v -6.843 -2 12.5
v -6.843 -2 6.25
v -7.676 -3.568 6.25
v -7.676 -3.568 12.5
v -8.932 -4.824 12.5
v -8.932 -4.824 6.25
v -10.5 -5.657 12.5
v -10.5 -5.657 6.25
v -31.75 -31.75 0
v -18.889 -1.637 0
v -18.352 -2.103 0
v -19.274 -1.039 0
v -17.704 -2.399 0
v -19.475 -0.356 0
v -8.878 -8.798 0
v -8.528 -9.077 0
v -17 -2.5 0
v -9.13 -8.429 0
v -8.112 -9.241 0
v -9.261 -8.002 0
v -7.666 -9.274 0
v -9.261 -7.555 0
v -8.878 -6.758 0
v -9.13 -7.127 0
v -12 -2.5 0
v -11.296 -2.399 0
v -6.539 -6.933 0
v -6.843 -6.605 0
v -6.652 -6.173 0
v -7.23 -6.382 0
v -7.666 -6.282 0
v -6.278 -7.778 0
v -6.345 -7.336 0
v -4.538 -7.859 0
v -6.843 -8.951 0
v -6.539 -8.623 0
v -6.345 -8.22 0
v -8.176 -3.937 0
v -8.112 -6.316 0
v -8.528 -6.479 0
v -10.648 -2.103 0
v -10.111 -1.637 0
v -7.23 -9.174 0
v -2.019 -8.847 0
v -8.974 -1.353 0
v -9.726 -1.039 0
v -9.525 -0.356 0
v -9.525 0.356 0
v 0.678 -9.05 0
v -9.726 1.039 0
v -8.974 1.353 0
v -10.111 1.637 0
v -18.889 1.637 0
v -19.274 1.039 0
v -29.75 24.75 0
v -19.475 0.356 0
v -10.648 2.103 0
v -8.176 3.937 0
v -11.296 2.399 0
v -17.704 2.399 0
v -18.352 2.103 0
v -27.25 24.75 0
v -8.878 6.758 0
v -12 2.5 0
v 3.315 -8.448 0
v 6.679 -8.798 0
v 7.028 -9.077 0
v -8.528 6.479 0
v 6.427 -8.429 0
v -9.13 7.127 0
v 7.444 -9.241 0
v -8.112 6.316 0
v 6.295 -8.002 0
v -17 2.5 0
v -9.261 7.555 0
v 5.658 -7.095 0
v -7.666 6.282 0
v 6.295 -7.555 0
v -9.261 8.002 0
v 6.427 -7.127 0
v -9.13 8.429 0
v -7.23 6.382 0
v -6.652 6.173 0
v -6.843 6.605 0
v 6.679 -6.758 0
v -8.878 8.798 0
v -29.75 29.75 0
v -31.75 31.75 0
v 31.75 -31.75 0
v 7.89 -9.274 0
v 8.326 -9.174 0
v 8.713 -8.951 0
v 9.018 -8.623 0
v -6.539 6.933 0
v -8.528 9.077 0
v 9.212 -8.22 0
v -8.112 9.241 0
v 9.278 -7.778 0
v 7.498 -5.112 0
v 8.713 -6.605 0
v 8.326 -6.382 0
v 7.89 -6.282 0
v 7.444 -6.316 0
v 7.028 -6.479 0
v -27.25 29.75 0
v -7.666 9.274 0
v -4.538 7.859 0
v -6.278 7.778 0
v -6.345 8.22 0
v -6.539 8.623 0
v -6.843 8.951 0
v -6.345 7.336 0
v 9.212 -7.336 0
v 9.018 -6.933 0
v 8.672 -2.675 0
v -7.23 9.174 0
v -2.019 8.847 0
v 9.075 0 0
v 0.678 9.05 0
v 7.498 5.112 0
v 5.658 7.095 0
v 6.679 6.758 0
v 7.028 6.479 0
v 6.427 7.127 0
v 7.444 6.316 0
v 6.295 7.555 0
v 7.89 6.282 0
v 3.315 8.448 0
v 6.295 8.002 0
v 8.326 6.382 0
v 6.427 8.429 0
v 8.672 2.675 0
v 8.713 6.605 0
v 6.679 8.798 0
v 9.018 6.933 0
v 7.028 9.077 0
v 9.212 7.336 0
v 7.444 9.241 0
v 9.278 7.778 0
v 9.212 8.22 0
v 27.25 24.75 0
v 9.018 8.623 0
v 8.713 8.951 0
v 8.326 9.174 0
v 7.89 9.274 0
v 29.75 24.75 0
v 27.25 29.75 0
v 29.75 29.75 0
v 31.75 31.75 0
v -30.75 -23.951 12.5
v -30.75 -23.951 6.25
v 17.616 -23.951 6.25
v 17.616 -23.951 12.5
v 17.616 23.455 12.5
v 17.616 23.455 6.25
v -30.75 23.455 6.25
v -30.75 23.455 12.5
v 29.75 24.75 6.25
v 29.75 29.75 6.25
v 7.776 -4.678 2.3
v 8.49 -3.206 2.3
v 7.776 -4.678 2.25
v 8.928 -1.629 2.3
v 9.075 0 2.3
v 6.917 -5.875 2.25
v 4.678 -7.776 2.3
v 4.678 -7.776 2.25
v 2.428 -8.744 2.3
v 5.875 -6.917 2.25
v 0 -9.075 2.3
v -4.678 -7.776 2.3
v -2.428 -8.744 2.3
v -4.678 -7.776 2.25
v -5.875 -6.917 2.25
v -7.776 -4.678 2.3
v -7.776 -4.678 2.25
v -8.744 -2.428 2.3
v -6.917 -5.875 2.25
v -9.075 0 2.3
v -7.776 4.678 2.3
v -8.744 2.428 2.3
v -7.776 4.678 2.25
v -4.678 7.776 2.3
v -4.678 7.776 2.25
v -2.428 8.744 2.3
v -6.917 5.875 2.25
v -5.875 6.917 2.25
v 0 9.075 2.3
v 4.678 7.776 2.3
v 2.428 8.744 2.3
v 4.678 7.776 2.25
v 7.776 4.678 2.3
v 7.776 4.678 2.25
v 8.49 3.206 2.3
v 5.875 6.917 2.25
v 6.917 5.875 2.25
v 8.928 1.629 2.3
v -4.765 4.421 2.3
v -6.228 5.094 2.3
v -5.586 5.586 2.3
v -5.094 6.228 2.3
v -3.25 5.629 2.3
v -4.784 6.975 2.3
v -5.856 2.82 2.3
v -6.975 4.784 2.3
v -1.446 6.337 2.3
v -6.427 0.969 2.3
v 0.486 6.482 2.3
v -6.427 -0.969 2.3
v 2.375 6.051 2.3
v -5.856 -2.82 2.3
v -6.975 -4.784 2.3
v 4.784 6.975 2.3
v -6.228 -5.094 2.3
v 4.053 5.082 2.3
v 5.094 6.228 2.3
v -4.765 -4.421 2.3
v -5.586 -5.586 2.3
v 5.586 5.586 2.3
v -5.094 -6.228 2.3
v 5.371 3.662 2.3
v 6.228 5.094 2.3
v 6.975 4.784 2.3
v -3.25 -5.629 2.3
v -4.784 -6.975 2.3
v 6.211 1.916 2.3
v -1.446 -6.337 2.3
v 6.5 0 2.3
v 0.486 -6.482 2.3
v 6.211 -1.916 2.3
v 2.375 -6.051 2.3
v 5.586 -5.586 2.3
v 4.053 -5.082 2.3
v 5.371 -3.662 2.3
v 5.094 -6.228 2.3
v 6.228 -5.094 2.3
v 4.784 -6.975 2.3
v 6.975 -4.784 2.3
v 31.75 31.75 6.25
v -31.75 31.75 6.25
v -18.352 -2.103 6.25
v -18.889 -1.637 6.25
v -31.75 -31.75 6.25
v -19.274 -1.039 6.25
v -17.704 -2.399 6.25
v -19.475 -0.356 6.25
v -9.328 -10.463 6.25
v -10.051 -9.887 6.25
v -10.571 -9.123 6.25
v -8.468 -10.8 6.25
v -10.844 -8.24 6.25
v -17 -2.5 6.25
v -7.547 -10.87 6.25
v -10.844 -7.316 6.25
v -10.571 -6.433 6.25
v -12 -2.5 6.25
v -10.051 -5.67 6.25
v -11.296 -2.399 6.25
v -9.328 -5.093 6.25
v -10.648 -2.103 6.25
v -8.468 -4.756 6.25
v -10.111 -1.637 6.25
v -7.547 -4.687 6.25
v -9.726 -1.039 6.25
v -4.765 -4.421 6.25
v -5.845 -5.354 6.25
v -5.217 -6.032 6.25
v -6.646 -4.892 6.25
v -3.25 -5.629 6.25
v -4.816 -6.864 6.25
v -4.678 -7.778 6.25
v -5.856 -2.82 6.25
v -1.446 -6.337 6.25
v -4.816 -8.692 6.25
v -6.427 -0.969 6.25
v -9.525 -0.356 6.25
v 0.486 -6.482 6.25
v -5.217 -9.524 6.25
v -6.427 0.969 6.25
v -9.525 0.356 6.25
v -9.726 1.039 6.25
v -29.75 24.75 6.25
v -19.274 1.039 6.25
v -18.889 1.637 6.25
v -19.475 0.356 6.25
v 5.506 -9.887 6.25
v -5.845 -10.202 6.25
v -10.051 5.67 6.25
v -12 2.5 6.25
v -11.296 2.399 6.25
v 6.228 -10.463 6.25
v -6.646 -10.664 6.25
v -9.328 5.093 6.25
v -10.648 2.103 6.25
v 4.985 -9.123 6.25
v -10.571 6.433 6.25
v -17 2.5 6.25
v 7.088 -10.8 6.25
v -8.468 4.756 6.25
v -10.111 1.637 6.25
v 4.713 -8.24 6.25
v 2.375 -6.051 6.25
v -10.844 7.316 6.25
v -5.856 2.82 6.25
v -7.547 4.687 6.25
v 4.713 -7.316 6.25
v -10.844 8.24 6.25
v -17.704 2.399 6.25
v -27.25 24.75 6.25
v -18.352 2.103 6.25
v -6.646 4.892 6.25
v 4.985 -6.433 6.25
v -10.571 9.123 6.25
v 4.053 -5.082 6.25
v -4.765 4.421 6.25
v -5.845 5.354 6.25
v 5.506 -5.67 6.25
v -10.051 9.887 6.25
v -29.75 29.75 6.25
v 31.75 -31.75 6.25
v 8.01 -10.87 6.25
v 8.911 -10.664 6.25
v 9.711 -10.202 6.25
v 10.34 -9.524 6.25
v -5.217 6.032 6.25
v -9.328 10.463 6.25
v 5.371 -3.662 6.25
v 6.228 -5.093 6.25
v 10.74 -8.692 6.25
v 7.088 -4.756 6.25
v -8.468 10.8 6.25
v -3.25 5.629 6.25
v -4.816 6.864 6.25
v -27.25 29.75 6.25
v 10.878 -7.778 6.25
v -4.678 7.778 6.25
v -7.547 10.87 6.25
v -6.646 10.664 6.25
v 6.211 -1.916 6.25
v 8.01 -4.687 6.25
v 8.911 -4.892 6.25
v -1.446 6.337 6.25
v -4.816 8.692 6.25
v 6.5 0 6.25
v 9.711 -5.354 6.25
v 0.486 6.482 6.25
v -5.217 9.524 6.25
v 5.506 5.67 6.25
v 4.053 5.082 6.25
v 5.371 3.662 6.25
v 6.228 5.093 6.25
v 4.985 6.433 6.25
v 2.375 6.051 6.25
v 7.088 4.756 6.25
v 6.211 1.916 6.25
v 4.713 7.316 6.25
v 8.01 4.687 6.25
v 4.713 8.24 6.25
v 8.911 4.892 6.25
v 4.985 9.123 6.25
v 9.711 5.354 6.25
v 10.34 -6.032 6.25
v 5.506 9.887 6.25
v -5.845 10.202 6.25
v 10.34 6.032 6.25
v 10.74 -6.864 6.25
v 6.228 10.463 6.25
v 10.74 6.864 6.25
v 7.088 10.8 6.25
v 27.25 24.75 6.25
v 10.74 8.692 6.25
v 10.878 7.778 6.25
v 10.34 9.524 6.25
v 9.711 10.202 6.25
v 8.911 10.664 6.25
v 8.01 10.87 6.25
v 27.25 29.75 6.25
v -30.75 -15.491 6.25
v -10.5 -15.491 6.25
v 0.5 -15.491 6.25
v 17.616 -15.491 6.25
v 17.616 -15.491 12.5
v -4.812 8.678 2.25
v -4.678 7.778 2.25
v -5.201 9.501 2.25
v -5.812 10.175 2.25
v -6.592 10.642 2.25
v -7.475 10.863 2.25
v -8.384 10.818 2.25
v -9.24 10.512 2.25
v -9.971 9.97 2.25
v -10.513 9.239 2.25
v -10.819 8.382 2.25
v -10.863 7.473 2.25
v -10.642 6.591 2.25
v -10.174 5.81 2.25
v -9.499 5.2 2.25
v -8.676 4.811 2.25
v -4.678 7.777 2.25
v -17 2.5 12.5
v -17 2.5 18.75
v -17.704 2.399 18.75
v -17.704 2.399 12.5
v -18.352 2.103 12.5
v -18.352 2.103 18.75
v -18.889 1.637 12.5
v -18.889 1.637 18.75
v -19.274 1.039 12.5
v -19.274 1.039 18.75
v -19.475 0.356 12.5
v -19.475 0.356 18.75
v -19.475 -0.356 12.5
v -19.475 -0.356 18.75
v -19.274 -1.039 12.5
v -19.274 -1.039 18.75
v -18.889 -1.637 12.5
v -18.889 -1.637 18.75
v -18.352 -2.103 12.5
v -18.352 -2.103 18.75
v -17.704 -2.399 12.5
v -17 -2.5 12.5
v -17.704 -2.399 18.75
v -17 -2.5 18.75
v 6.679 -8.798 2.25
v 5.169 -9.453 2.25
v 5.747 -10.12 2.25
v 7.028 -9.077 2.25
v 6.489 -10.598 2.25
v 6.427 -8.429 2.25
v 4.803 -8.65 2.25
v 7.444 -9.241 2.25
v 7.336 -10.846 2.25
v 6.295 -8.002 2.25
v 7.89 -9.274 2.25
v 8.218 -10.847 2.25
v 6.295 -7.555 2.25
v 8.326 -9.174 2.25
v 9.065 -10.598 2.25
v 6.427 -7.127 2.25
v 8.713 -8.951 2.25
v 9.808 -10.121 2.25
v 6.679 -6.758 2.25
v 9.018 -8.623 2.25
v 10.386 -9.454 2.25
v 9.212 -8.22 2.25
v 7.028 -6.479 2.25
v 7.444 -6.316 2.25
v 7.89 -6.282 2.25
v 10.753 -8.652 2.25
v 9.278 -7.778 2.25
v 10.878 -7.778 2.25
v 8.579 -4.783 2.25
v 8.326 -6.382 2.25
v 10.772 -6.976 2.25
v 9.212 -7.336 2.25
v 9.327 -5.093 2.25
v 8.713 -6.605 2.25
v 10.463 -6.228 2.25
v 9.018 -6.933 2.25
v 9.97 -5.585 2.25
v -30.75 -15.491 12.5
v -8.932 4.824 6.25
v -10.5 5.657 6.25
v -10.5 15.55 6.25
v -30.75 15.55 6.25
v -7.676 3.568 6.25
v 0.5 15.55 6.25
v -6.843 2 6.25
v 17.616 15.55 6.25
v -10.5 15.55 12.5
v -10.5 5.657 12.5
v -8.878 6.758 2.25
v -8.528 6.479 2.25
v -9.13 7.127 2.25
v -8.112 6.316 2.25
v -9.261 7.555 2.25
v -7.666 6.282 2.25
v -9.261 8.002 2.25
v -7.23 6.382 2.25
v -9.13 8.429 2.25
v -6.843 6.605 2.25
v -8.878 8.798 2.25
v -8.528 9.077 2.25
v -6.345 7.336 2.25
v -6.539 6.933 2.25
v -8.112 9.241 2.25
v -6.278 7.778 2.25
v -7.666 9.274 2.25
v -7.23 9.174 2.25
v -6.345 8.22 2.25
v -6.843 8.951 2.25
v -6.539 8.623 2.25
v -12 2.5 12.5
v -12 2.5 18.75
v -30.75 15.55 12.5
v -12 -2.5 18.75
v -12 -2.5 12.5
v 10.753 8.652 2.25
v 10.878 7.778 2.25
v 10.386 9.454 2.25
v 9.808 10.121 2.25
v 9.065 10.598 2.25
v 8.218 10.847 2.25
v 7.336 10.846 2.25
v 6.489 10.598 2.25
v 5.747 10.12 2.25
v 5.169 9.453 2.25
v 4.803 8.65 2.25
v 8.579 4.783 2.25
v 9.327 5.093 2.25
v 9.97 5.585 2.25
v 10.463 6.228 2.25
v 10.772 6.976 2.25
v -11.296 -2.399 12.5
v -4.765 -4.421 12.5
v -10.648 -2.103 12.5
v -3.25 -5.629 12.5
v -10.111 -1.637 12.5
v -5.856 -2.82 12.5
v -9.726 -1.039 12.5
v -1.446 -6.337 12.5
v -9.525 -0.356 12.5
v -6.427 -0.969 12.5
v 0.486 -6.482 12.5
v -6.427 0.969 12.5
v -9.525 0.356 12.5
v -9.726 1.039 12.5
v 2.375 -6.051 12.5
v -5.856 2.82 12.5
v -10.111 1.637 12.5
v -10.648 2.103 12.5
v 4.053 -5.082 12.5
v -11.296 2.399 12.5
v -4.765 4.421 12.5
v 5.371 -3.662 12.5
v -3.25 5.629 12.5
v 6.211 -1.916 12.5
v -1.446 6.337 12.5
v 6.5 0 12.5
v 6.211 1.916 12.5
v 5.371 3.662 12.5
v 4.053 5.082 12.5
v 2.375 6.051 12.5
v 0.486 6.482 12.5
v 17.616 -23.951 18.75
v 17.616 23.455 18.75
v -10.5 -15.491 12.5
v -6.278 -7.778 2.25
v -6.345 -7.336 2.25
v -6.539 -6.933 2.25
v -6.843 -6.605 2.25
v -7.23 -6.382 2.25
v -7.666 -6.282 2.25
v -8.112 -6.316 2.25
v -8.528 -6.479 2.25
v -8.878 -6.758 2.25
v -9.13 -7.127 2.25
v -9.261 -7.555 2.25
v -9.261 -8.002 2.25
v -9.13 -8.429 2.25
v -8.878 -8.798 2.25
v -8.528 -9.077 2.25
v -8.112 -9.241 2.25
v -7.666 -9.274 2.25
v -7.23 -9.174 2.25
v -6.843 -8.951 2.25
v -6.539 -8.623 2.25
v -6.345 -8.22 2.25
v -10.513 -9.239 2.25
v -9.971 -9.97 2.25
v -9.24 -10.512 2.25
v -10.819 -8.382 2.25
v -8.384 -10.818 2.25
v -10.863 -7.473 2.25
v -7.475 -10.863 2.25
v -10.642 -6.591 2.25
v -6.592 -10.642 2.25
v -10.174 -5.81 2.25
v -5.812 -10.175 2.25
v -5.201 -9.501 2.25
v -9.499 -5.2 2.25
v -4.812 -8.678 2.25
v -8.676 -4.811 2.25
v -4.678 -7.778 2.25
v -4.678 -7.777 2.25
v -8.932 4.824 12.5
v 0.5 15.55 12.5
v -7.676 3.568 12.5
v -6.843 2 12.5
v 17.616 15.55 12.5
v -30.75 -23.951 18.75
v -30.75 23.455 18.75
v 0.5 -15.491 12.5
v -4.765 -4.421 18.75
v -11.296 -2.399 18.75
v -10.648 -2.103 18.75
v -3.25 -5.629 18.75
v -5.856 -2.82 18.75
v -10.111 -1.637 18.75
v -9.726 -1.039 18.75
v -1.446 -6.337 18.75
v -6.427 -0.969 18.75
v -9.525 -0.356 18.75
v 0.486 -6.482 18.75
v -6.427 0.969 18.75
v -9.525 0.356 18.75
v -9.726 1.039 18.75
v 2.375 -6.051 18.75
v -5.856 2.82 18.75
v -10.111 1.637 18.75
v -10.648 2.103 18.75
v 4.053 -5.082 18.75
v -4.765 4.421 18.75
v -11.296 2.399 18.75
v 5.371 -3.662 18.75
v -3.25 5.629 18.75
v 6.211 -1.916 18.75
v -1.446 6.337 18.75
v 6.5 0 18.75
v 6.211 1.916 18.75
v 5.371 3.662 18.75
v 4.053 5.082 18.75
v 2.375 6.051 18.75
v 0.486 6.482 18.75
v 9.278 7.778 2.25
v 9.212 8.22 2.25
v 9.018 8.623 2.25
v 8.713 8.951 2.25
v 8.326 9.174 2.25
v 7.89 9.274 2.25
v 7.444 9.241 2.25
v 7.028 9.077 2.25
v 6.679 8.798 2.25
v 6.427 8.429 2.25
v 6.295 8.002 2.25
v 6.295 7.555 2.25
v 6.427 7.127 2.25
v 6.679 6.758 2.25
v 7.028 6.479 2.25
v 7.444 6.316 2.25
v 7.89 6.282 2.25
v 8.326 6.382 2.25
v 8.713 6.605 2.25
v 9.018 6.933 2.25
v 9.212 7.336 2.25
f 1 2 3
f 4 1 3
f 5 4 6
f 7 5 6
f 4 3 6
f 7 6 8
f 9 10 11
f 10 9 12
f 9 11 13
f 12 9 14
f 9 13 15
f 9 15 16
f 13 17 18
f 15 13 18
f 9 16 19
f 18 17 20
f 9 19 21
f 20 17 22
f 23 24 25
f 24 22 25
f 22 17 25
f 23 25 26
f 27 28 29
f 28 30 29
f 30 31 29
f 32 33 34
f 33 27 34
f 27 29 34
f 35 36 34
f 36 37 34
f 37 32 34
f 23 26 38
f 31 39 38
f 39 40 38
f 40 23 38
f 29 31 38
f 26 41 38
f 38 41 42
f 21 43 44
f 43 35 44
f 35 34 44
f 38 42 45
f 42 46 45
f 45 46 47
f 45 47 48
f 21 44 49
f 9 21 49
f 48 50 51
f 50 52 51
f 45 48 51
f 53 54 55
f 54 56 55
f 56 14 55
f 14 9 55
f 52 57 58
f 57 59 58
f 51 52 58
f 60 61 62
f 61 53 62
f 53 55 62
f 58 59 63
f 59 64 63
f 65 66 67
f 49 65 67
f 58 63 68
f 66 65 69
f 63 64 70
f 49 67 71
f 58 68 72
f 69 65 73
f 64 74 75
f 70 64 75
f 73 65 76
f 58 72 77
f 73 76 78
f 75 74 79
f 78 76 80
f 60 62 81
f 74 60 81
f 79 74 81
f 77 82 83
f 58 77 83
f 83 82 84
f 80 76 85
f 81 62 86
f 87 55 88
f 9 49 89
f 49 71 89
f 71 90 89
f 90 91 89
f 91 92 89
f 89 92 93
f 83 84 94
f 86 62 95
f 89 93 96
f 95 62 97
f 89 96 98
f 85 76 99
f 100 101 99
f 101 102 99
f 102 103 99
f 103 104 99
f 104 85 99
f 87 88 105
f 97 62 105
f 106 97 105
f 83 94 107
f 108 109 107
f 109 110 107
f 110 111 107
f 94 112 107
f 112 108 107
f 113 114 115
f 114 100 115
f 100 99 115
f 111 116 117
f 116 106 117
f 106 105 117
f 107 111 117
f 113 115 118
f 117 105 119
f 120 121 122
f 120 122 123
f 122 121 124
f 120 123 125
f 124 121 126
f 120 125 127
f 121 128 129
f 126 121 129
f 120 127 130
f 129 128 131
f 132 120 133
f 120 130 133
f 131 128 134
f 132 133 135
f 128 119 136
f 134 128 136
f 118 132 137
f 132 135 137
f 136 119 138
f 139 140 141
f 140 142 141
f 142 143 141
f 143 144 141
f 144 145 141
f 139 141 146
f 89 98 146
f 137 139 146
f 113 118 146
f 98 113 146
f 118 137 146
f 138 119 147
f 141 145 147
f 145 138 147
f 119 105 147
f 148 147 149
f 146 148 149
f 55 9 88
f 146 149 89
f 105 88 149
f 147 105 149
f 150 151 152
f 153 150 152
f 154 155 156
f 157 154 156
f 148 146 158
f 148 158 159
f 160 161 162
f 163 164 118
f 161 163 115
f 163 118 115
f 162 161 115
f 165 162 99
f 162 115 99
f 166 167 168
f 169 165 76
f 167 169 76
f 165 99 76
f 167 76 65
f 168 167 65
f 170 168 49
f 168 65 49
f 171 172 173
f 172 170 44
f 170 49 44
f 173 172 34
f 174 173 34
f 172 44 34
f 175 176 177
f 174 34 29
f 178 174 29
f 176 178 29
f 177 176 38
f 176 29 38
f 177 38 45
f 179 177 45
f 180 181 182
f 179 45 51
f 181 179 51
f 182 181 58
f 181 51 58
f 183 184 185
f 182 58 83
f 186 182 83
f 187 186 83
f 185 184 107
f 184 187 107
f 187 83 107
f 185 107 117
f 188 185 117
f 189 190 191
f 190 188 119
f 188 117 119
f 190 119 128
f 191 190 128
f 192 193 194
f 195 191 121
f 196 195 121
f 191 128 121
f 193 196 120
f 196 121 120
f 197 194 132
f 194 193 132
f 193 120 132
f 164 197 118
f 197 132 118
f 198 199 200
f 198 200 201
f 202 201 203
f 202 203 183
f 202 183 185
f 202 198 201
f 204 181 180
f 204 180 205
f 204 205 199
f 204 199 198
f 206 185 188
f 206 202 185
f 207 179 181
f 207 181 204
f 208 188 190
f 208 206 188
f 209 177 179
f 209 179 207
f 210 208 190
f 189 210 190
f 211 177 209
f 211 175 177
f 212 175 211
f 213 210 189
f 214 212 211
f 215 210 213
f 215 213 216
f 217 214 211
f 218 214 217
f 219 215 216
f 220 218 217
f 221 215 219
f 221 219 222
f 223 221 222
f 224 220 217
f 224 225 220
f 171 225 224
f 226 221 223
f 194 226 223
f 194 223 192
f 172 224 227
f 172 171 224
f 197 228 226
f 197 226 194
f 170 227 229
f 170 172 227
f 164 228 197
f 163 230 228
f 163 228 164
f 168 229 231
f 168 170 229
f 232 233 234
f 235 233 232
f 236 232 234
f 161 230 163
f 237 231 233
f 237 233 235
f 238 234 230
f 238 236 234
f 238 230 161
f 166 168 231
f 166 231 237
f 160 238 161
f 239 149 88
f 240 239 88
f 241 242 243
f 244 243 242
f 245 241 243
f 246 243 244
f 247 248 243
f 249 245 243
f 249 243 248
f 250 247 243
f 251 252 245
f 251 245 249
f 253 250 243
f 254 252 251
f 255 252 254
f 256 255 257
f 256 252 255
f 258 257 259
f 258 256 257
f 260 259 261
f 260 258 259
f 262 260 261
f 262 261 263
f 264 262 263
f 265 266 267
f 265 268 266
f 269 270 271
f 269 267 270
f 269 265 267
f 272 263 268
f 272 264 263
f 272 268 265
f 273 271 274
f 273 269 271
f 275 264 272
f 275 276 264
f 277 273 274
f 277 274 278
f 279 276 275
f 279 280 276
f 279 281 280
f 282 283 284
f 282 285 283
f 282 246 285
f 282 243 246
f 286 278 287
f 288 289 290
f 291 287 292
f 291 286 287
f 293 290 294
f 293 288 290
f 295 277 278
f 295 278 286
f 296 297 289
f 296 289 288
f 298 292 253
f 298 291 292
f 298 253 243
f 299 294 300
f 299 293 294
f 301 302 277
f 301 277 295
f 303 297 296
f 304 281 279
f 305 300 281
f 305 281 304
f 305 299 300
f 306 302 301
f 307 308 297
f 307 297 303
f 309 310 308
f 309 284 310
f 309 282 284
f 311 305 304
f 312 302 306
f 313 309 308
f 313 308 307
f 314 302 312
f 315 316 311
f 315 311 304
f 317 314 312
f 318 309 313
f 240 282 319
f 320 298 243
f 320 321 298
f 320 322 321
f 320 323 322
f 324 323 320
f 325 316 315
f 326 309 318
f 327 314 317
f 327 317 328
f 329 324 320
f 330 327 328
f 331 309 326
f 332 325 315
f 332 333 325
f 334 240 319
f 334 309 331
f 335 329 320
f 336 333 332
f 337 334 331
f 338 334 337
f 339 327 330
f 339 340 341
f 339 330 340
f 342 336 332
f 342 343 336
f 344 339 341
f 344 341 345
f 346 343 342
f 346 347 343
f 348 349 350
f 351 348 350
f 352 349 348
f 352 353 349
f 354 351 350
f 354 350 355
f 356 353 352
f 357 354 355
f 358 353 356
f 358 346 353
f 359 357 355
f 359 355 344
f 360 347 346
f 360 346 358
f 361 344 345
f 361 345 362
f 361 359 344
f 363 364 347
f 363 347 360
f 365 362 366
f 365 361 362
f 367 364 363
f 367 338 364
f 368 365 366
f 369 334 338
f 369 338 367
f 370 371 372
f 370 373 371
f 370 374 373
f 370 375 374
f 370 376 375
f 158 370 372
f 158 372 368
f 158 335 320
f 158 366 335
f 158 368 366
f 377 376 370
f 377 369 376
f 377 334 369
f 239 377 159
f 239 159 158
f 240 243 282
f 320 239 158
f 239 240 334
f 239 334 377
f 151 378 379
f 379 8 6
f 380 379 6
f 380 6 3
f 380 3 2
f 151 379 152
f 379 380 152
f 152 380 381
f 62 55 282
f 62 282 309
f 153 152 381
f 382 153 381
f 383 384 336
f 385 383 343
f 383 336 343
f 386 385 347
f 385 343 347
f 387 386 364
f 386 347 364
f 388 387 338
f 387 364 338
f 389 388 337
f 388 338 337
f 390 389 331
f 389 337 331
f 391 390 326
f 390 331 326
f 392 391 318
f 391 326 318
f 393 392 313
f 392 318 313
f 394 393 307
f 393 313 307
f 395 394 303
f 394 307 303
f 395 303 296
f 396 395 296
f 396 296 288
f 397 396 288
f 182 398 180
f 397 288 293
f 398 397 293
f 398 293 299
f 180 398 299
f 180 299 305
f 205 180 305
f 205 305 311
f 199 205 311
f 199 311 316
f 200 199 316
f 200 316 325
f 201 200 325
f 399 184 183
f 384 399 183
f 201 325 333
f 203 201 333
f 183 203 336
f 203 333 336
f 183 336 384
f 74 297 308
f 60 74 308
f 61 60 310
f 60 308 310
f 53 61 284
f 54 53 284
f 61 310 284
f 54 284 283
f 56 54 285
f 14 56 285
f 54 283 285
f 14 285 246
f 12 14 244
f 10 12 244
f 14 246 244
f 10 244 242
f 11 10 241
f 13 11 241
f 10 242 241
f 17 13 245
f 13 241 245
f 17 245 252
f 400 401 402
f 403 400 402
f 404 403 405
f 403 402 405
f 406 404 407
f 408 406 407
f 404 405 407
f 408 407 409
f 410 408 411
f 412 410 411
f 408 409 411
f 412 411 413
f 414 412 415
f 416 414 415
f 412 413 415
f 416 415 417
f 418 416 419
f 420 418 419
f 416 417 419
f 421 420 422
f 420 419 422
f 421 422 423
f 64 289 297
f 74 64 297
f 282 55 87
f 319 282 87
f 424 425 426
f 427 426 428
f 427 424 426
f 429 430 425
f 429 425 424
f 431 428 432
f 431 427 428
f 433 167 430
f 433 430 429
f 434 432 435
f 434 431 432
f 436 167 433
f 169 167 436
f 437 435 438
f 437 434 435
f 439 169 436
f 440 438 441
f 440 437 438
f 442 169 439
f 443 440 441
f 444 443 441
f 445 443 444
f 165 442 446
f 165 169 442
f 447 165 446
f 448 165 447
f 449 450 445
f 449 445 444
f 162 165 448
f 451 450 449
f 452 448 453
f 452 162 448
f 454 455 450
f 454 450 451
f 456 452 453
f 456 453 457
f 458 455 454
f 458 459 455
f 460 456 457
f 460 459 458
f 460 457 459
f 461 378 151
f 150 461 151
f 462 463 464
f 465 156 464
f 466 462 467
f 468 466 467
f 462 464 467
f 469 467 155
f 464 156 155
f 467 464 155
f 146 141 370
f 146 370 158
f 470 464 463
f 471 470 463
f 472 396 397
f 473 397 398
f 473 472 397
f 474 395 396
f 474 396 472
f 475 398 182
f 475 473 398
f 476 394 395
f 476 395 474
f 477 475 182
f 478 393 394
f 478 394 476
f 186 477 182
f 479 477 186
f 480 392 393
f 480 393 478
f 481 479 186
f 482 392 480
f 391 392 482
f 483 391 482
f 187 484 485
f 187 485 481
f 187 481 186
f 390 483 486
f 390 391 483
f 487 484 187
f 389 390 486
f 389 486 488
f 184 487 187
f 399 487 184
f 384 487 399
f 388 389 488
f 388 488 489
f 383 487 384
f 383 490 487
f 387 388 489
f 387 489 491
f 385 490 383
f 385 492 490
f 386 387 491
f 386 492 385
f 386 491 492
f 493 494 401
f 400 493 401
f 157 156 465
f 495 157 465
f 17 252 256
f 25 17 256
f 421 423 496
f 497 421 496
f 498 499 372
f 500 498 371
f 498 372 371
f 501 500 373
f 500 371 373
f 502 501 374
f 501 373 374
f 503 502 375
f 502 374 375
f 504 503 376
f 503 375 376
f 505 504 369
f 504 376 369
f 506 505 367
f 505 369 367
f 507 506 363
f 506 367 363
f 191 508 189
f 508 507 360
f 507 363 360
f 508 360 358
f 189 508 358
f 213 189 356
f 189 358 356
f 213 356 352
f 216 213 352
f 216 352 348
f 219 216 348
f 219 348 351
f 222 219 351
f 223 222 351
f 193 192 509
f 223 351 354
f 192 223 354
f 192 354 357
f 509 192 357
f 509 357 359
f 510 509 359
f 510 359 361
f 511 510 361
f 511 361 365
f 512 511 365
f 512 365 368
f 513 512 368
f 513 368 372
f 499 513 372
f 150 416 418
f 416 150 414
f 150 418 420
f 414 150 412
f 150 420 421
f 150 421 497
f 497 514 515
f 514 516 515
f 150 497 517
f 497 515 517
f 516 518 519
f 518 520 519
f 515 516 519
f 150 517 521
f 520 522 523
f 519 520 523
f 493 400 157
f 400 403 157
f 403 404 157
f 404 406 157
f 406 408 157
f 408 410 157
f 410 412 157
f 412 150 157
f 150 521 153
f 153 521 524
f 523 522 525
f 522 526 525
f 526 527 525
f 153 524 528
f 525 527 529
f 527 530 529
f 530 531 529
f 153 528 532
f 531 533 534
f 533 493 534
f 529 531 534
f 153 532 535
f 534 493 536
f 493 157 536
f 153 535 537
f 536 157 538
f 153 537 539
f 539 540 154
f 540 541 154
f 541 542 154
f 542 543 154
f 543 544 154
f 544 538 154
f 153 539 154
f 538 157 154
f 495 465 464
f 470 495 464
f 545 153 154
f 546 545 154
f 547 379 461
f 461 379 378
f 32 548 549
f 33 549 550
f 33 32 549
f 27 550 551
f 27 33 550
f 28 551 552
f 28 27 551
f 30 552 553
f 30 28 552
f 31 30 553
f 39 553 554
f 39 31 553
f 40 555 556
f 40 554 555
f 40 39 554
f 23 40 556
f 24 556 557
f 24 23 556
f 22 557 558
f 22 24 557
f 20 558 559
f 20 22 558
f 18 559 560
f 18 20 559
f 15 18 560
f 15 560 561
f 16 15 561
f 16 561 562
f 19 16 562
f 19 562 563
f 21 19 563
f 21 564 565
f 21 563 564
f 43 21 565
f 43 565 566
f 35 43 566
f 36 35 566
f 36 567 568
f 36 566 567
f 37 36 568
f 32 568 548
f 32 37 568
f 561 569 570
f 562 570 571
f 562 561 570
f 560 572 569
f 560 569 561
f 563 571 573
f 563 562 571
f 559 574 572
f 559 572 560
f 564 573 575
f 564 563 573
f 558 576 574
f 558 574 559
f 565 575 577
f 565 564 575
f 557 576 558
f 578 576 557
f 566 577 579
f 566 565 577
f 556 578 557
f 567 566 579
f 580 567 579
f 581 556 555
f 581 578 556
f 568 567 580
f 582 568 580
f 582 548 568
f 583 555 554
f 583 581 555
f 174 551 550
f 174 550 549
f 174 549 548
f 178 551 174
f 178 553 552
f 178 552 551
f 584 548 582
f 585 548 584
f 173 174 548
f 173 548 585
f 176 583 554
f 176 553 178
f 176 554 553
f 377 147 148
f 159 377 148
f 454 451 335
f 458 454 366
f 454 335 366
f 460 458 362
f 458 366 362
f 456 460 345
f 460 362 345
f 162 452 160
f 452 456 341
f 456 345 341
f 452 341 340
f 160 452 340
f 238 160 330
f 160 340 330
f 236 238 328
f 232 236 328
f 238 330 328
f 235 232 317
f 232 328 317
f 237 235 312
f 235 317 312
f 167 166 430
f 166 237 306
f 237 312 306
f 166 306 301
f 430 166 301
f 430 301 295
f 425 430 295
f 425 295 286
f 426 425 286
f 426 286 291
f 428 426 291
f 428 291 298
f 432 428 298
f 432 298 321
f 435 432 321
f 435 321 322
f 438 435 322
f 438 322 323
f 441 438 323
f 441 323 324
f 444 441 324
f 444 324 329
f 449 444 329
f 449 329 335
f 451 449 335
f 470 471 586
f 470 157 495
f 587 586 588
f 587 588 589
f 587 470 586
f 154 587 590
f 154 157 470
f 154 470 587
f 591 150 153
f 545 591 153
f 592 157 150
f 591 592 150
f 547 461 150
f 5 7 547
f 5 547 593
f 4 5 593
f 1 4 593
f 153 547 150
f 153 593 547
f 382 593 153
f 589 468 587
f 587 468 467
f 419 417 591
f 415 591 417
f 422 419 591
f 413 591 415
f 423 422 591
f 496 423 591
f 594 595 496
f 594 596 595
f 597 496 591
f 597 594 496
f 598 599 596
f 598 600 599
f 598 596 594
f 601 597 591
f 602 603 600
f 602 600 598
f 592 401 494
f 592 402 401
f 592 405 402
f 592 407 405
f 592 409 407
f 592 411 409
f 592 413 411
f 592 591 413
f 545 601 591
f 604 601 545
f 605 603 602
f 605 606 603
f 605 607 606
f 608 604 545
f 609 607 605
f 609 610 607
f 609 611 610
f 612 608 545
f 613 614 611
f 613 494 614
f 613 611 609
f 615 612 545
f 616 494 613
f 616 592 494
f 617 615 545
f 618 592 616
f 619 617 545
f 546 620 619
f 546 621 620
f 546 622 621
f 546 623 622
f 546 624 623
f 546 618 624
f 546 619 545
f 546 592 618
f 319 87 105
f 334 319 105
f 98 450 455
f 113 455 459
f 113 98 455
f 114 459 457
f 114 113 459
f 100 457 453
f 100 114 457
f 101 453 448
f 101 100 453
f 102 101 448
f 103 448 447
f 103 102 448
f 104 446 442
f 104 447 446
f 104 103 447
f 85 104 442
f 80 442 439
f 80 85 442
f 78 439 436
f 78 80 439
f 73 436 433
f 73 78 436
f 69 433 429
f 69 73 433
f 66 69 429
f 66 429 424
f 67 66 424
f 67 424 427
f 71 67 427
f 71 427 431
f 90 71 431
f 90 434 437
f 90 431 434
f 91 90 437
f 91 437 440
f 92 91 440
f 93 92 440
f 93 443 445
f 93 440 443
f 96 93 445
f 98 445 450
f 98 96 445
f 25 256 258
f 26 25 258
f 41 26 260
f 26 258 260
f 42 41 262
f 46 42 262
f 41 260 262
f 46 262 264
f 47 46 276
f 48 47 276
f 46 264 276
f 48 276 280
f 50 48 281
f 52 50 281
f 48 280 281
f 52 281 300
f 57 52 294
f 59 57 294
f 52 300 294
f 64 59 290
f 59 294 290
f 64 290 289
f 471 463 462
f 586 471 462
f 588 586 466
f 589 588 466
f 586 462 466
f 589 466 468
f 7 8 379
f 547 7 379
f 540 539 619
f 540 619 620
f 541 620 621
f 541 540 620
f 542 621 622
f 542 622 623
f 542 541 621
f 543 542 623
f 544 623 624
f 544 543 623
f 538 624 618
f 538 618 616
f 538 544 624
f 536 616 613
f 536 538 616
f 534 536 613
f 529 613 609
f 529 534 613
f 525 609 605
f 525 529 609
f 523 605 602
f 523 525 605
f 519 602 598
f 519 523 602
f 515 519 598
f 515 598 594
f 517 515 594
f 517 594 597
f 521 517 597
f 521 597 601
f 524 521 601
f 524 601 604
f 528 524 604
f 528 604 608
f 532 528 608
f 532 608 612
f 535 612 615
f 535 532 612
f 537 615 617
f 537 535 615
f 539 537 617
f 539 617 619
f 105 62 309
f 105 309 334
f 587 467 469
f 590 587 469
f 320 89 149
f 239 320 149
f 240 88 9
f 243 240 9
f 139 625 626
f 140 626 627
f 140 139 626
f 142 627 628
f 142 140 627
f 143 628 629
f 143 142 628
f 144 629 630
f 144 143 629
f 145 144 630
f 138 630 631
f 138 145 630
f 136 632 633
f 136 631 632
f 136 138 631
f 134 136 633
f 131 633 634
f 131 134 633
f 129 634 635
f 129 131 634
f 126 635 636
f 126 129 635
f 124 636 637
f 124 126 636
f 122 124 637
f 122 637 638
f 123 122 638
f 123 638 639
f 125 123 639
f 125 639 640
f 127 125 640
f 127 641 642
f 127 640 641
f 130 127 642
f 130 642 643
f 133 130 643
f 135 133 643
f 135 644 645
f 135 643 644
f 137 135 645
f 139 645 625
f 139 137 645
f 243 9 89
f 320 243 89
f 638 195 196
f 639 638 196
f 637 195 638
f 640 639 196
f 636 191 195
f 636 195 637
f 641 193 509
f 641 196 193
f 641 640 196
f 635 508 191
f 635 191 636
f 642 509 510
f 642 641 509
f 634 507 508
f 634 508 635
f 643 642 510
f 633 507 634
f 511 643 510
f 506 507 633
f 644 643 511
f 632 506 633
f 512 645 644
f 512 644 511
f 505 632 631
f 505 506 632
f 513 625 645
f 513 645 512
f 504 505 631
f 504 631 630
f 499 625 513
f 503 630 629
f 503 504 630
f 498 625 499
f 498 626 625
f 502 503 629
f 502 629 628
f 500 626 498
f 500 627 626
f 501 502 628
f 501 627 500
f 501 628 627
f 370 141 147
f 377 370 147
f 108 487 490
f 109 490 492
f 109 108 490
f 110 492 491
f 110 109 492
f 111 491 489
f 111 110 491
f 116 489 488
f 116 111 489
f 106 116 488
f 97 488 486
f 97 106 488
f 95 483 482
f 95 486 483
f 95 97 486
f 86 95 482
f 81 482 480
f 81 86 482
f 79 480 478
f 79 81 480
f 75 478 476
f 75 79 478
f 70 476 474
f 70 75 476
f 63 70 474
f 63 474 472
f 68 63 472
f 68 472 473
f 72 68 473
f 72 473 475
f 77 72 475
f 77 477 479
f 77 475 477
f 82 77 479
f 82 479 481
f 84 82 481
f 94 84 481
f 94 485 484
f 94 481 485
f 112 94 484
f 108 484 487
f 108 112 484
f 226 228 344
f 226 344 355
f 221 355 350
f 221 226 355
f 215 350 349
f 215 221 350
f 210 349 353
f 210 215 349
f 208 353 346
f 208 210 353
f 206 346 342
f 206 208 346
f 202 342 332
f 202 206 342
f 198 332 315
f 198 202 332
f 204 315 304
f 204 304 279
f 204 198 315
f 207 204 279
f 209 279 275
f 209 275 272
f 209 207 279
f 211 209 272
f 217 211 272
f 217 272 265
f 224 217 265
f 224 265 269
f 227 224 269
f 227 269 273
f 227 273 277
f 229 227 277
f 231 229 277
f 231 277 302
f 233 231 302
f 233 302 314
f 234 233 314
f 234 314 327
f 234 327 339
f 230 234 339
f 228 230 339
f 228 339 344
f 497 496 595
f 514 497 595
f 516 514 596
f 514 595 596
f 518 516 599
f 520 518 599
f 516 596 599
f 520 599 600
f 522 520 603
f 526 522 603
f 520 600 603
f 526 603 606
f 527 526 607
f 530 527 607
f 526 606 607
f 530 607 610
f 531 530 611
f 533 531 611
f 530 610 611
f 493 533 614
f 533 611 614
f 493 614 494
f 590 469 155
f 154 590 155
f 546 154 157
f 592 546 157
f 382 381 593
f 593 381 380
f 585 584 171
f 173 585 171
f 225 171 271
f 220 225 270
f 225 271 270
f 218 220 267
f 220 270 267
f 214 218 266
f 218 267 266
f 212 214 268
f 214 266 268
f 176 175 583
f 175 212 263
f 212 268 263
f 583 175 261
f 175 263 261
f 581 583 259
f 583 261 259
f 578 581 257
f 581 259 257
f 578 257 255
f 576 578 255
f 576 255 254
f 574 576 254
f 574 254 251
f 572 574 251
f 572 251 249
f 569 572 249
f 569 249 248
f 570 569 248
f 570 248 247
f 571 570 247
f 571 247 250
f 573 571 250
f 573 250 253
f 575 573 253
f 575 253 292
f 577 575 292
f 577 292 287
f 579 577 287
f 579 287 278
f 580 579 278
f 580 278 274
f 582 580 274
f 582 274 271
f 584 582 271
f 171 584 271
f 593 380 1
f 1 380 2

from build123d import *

# Parameters (mm, degrees)
F3_R      = 1.5
F3_W      = 2.5
F3_H      = 5
F3_R_2    = 6.5
F4_DEPTH  = 6.25
F5_R      = 3.1
F6_DEPTH  = 4
F7_R      = 9.075
F7_R_2    = 6.5
F8_DEPTH  = 2.3
F10_DEPTH = 6.25
F11_R     = 6.5
F12_DEPTH = 6.25
F14_DEPTH = 25


with BuildPart() as f4:
    # F3 (on Top) → F4 (new body)
    with BuildSketch(Plane.XY):
        Polygon((-27.25, 31.75), (-31.75, 31.75), (-31.75, -31.75), (31.75, -31.75), (31.75, 31.75), (27.25, 31.75), align=None)
        with Locations((-7.778175, -7.7781741861)):
            Circle(F3_R, mode=Mode.SUBTRACT)
        with Locations((7.7781741861, -7.778175)):
            Circle(F3_R, mode=Mode.SUBTRACT)
        with Locations((-7.7781741861, 7.778175)):
            Circle(F3_R, mode=Mode.SUBTRACT)
        with Locations((-28.5, 27.25)):
            Rectangle(F3_W, F3_H, mode=Mode.SUBTRACT)
        Circle(F3_R_2, mode=Mode.SUBTRACT)
        with Locations((7.778175, 7.7781741861)):
            Circle(F3_R, mode=Mode.SUBTRACT)
        with Locations((28.5, 27.25)):
            Rectangle(F3_W, F3_H, mode=Mode.SUBTRACT)
    extrude(amount=F4_DEPTH)

    # F5 (on face) → F6 (cut)
    with BuildSketch(Plane.XY.offset(6.25)):
        with Locations((-7.7781741861, 7.778175)):
            Circle(F5_R)
        with Locations((-7.778175, -7.7781741861)):
            Circle(F5_R)
        with Locations((7.7781741861, -7.778175)):
            Circle(F5_R)
        with Locations((7.778175, 7.7781741861)):
            Circle(F5_R)
    extrude(amount=-F6_DEPTH, mode=Mode.SUBTRACT)

    # F7 (on face) → F8 (cut)
    with BuildSketch(Plane(origin=(0, 0, 0), x_dir=(1, 0, 0), z_dir=(0, 0, -1))):
        Circle(F7_R)
        Circle(F7_R_2, mode=Mode.SUBTRACT)
    extrude(amount=-F8_DEPTH, mode=Mode.SUBTRACT)


with BuildPart() as f10:
    # F9 (on face) → F10 (new body)
    with BuildSketch(Plane.XY.offset(6.25)):
        with BuildLine():
            ThreePointArc((-10.5, 5.6568542495), (-8.2573593129, 4.2426406871), (-6.8431457505, 2))
            Line((-6.8431457505, 2), (0.5, 15.5502033014))
            Line((0.5, 15.5502033014), (-10.5, 15.5502033014))
            Line((-10.5, 15.5502033014), (-10.5, 5.6568542495))
        make_face()
        Polygon((-10.5, 15.5502033014), (0.5, 15.5502033014), (17.6161517501, 15.5502033014), (17.6161517501, 23.4547978675), (-30.75, 23.4547978675), (-30.75, 15.5502033014), align=None)
    extrude(amount=F10_DEPTH)


with BuildPart() as f10b:
    # F9 (on face) → F10, piece 2 (new body)
    with BuildSketch(Plane.XY.offset(6.25)):
        Polygon((-10.5, -15.4907594841), (-30.75, -15.4907594841), (-30.75, -23.9506369049), (17.6161517501, -23.9506369049), (17.6161517501, -15.4907594841), (0.5, -15.4907594841), align=None)
        with BuildLine():
            Line((-10.5, -5.6568542495), (-10.5, -15.4907594841))
            Line((-10.5, -15.4907594841), (0.5, -15.4907594841))
            Line((0.5, -15.4907594841), (-6.8431457505, -2))
            ThreePointArc((-6.8431457505, -2), (-8.2573593129, -4.2426406871), (-10.5, -5.6568542495))
        make_face()
    extrude(amount=F10_DEPTH)


with BuildPart() as f12:
    # F11 (on face) → F12 (new body)
    with BuildSketch(Plane.XY.offset(12.5)):
        with BuildLine():
            Line((17.6161517501, 23.4547978675), (-30.75, 23.4547978675))
            Line((-30.75, 23.4547978675), (-30.75, 15.5502033014))
            Line((-30.75, 15.5502033014), (-10.5, 15.5502033014))
            Line((-10.5, 15.5502033014), (-10.5, 5.6568542495))
            ThreePointArc((-10.5, 5.6568542495), (-8.2573593129, 4.2426406871), (-6.8431457505, 2))
            Line((-6.8431457505, 2), (0.5, 15.5502033014))
            Line((0.5, 15.5502033014), (17.6161517501, 15.5502033014))
            Line((17.6161517501, 15.5502033014), (17.6161517501, 23.4547978675))
        make_face()
        with BuildLine():
            Line((-10.5, 15.5502033014), (-30.75, 15.5502033014))
            Line((-30.75, 15.5502033014), (-30.75, -23.9506369049))
            Line((-30.75, -23.9506369049), (17.6161517501, -23.9506369049))
            Line((17.6161517501, -23.9506369049), (17.6161517501, 15.5502033014))
            Line((17.6161517501, 15.5502033014), (0.5, 15.5502033014))
            Line((0.5, 15.5502033014), (-6.8431457505, 2))
            ThreePointArc((-6.8431457505, 2), (-8.2573593129, 4.2426406871), (-10.5, 5.6568542495))
            Line((-10.5, 5.6568542495), (-10.5, 15.5502033014))
        make_face()
        Circle(F11_R, mode=Mode.SUBTRACT)
    extrude(amount=F12_DEPTH)


with BuildPart() as f14_tool:
    # F13 (on face) → F14 (new body)
    with BuildSketch(Plane.XY.offset(18.75)):
        with BuildLine():
            Line((-12, 2.5), (-17, 2.5))
            ThreePointArc((-17, 2.5), (-19.5, 0), (-17, -2.5))
            Line((-17, -2.5), (-12, -2.5))
            ThreePointArc((-12, -2.5), (-9.5, 0), (-12, 2.5))
        make_face()
    extrude(amount=-F14_DEPTH)


with BuildPart() as f4_1:
    add(f4.part)

    # F14: cut by f14_tool
    add(f14_tool.part, mode=Mode.SUBTRACT)


with BuildPart() as f12_1:
    add(f12.part)

    # F14: cut by f14_tool
    add(f14_tool.part, mode=Mode.SUBTRACT)


solid = Compound([f10.part, f10b.part, f4_1.part, f12_1.part])
